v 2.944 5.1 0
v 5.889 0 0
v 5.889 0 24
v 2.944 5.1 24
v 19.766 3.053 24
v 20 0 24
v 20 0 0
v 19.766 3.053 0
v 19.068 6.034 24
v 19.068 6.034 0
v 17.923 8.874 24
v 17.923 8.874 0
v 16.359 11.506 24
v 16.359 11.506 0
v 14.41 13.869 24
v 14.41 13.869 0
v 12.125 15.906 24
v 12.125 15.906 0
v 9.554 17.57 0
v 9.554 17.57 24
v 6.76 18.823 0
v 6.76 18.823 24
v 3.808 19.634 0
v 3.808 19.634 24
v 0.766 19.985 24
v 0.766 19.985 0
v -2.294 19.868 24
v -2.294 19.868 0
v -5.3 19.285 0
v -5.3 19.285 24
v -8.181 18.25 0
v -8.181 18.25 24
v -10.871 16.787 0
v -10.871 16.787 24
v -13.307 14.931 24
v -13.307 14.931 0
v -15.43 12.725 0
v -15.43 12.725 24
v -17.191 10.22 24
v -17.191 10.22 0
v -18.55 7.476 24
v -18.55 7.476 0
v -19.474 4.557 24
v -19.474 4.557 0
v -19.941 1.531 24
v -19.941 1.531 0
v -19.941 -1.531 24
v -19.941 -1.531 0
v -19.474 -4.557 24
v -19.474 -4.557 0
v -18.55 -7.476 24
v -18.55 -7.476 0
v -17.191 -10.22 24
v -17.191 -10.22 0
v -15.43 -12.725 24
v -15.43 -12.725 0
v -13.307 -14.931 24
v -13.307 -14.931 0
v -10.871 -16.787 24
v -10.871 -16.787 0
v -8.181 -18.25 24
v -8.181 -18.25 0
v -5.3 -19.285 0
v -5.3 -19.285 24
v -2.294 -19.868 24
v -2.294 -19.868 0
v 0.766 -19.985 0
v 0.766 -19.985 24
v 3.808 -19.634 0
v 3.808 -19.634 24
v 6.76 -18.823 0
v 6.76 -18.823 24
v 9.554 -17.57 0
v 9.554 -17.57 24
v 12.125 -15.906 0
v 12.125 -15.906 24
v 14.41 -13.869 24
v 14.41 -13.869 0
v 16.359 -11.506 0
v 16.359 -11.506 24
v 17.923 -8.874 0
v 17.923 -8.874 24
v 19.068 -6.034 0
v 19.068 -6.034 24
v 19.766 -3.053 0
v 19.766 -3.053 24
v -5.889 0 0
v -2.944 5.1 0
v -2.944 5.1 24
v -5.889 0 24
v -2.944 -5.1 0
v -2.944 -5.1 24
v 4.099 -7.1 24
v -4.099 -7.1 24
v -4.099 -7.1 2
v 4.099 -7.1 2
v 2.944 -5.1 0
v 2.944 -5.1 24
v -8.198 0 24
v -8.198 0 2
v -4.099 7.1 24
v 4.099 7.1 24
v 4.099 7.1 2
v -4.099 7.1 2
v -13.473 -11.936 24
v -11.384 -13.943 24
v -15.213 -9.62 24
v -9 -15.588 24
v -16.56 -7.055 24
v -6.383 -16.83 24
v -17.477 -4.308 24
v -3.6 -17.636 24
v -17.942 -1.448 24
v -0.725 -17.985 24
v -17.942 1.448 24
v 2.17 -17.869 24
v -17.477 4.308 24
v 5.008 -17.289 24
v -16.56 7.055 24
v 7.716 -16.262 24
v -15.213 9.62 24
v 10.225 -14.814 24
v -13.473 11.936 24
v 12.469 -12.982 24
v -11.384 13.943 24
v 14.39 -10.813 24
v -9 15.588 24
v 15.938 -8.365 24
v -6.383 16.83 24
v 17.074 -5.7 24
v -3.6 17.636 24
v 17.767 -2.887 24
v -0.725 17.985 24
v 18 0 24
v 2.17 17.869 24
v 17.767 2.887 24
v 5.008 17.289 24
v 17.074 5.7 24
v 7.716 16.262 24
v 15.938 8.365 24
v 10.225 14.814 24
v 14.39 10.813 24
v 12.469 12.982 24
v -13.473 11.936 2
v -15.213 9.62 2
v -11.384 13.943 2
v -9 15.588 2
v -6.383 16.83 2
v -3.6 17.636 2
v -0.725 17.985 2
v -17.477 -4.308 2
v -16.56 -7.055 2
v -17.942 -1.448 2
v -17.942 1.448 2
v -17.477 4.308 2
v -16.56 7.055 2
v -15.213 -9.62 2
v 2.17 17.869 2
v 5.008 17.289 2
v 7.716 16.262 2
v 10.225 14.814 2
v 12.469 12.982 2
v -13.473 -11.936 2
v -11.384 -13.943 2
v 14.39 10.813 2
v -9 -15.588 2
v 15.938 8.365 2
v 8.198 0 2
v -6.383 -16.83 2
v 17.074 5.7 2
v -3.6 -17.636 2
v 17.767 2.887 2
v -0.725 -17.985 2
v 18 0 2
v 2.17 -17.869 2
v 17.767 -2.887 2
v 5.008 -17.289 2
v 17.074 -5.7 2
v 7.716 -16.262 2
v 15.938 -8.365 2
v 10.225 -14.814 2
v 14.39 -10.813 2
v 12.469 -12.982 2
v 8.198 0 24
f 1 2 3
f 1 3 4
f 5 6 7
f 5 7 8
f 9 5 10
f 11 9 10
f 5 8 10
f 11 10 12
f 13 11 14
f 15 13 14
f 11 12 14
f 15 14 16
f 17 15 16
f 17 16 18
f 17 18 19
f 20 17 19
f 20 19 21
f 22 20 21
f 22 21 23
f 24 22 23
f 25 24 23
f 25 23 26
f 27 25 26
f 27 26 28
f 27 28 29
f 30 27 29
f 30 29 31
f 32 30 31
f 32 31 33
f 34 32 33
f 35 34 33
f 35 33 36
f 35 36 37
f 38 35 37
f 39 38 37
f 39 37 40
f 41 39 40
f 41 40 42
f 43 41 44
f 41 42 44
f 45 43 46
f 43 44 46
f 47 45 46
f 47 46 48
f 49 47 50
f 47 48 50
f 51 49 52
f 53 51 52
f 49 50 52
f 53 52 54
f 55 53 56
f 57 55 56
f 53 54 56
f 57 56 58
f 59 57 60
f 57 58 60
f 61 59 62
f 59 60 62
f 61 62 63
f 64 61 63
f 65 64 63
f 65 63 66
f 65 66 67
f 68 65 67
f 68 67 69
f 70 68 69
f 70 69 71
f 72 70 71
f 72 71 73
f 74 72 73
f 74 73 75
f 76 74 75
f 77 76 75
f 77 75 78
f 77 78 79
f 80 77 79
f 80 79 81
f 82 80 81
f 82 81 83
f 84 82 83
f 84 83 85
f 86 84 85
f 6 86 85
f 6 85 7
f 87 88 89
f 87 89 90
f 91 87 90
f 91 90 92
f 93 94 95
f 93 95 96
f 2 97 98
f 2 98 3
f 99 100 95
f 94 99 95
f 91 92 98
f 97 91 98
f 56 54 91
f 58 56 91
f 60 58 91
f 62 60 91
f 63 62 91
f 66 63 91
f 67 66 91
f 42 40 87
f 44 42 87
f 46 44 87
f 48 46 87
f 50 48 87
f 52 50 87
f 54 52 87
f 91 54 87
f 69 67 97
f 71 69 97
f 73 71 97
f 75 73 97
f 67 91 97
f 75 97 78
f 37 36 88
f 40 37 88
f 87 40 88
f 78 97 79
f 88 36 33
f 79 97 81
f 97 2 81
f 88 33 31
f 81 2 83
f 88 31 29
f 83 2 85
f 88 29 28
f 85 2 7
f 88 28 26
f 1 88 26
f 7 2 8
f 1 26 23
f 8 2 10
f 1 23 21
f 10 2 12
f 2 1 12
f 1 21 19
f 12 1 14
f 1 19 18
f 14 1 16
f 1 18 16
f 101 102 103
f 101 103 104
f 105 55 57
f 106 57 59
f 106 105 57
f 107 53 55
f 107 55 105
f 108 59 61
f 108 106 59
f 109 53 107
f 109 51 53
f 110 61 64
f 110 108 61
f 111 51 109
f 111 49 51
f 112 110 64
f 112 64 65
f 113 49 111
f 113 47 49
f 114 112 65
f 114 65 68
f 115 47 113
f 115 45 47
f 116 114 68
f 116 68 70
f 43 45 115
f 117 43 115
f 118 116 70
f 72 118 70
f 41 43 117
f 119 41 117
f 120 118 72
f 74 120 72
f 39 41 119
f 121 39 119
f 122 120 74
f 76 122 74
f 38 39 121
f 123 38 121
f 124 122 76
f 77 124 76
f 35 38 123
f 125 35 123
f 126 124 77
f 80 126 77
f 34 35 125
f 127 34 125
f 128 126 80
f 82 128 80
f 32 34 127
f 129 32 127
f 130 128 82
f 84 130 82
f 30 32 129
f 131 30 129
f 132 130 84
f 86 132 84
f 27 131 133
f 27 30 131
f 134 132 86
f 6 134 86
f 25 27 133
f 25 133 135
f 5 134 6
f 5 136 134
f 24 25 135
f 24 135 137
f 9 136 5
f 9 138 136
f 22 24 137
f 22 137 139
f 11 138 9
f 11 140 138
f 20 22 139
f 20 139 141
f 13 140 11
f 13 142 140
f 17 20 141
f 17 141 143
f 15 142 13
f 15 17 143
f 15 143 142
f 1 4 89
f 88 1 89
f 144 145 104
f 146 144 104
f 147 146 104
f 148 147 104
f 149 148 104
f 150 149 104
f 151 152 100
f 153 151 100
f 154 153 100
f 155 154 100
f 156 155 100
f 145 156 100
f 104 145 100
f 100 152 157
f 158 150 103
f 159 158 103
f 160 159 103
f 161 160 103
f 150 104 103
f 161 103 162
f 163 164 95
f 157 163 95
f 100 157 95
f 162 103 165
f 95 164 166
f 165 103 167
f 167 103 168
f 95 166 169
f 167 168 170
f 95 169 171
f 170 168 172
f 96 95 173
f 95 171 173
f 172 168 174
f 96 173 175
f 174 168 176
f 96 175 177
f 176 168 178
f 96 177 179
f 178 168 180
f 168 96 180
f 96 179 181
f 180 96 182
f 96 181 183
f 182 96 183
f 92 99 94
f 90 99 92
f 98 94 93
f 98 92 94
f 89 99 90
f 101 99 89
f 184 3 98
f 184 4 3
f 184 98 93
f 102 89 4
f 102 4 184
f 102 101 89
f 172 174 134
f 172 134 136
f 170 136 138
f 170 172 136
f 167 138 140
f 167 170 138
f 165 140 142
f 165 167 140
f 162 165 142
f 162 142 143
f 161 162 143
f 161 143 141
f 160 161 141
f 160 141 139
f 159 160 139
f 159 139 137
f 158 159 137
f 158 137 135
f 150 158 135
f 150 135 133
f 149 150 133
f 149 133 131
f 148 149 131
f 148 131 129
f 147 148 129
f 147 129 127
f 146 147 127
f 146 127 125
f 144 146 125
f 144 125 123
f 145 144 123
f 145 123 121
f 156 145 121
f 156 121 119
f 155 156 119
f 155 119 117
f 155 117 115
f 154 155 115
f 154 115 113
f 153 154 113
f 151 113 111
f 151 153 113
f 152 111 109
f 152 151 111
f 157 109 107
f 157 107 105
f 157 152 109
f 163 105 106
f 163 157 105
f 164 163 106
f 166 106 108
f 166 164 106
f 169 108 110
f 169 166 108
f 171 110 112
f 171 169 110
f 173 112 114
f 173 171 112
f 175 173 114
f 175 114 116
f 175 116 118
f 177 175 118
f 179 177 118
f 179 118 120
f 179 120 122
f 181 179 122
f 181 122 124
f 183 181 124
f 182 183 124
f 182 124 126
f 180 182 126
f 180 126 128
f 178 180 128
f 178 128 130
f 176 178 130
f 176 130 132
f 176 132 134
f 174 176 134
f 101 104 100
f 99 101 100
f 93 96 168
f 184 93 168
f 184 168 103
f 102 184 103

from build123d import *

# Parameters (mm, degrees)
SKETCH_1_R        = 20
SKETCH_1_R_2      = 18
EXTRUDE_1_DEPTH   = 24
EXTRUDE_1_2_DEPTH = 24
SKETCH_2_R        = 20
EXTRUDE_2_DEPTH   = 2


with BuildPart() as part:
    # 草图1 → 凸台-拉伸1 (new body)
    with BuildSketch(Plane.XY):
        Circle(SKETCH_1_R)
        Circle(SKETCH_1_R_2, mode=Mode.SUBTRACT)
    extrude(amount=EXTRUDE_1_DEPTH)



with BuildPart() as body_2:
    # 草图1 → Extrude 1 2 (new body)
    with BuildSketch(Plane.XY):
        Polygon((4.099186911, -7.1), (8.198373822, 0), (4.099186911, 7.1), (-4.099186911, 7.1), (-8.198373822, 0), (-4.099186911, -7.1), align=None)
        Polygon((2.944486373, -5.1), (5.888972746, 0), (2.944486373, 5.1), (-2.944486373, 5.1), (-5.888972746, 0), (-2.944486373, -5.1), align=None, mode=Mode.SUBTRACT)
    extrude(amount=EXTRUDE_1_2_DEPTH)


with BuildPart() as part_1:
    add(part.part)

    add(body_2.part)  # 凸台-拉伸2 merges body 2
    # 草图2 → 凸台-拉伸2 (add)
    with BuildSketch(Plane(origin=(0, 0, 0), x_dir=(-1, 0, 0), z_dir=(0, 0, -1))):
        with Locations(Location((0, 0, 0), (0, 0, 180))):
            Circle(SKETCH_2_R)
        Polygon((2.944486373, 5.1), (5.888972746, 0), (2.944486373, -5.1), (-2.944486373, -5.1), (-5.888972746, 0), (-2.944486373, 5.1), align=None, mode=Mode.SUBTRACT)
    extrude(amount=-EXTRUDE_2_DEPTH)


solid = part_1.part
